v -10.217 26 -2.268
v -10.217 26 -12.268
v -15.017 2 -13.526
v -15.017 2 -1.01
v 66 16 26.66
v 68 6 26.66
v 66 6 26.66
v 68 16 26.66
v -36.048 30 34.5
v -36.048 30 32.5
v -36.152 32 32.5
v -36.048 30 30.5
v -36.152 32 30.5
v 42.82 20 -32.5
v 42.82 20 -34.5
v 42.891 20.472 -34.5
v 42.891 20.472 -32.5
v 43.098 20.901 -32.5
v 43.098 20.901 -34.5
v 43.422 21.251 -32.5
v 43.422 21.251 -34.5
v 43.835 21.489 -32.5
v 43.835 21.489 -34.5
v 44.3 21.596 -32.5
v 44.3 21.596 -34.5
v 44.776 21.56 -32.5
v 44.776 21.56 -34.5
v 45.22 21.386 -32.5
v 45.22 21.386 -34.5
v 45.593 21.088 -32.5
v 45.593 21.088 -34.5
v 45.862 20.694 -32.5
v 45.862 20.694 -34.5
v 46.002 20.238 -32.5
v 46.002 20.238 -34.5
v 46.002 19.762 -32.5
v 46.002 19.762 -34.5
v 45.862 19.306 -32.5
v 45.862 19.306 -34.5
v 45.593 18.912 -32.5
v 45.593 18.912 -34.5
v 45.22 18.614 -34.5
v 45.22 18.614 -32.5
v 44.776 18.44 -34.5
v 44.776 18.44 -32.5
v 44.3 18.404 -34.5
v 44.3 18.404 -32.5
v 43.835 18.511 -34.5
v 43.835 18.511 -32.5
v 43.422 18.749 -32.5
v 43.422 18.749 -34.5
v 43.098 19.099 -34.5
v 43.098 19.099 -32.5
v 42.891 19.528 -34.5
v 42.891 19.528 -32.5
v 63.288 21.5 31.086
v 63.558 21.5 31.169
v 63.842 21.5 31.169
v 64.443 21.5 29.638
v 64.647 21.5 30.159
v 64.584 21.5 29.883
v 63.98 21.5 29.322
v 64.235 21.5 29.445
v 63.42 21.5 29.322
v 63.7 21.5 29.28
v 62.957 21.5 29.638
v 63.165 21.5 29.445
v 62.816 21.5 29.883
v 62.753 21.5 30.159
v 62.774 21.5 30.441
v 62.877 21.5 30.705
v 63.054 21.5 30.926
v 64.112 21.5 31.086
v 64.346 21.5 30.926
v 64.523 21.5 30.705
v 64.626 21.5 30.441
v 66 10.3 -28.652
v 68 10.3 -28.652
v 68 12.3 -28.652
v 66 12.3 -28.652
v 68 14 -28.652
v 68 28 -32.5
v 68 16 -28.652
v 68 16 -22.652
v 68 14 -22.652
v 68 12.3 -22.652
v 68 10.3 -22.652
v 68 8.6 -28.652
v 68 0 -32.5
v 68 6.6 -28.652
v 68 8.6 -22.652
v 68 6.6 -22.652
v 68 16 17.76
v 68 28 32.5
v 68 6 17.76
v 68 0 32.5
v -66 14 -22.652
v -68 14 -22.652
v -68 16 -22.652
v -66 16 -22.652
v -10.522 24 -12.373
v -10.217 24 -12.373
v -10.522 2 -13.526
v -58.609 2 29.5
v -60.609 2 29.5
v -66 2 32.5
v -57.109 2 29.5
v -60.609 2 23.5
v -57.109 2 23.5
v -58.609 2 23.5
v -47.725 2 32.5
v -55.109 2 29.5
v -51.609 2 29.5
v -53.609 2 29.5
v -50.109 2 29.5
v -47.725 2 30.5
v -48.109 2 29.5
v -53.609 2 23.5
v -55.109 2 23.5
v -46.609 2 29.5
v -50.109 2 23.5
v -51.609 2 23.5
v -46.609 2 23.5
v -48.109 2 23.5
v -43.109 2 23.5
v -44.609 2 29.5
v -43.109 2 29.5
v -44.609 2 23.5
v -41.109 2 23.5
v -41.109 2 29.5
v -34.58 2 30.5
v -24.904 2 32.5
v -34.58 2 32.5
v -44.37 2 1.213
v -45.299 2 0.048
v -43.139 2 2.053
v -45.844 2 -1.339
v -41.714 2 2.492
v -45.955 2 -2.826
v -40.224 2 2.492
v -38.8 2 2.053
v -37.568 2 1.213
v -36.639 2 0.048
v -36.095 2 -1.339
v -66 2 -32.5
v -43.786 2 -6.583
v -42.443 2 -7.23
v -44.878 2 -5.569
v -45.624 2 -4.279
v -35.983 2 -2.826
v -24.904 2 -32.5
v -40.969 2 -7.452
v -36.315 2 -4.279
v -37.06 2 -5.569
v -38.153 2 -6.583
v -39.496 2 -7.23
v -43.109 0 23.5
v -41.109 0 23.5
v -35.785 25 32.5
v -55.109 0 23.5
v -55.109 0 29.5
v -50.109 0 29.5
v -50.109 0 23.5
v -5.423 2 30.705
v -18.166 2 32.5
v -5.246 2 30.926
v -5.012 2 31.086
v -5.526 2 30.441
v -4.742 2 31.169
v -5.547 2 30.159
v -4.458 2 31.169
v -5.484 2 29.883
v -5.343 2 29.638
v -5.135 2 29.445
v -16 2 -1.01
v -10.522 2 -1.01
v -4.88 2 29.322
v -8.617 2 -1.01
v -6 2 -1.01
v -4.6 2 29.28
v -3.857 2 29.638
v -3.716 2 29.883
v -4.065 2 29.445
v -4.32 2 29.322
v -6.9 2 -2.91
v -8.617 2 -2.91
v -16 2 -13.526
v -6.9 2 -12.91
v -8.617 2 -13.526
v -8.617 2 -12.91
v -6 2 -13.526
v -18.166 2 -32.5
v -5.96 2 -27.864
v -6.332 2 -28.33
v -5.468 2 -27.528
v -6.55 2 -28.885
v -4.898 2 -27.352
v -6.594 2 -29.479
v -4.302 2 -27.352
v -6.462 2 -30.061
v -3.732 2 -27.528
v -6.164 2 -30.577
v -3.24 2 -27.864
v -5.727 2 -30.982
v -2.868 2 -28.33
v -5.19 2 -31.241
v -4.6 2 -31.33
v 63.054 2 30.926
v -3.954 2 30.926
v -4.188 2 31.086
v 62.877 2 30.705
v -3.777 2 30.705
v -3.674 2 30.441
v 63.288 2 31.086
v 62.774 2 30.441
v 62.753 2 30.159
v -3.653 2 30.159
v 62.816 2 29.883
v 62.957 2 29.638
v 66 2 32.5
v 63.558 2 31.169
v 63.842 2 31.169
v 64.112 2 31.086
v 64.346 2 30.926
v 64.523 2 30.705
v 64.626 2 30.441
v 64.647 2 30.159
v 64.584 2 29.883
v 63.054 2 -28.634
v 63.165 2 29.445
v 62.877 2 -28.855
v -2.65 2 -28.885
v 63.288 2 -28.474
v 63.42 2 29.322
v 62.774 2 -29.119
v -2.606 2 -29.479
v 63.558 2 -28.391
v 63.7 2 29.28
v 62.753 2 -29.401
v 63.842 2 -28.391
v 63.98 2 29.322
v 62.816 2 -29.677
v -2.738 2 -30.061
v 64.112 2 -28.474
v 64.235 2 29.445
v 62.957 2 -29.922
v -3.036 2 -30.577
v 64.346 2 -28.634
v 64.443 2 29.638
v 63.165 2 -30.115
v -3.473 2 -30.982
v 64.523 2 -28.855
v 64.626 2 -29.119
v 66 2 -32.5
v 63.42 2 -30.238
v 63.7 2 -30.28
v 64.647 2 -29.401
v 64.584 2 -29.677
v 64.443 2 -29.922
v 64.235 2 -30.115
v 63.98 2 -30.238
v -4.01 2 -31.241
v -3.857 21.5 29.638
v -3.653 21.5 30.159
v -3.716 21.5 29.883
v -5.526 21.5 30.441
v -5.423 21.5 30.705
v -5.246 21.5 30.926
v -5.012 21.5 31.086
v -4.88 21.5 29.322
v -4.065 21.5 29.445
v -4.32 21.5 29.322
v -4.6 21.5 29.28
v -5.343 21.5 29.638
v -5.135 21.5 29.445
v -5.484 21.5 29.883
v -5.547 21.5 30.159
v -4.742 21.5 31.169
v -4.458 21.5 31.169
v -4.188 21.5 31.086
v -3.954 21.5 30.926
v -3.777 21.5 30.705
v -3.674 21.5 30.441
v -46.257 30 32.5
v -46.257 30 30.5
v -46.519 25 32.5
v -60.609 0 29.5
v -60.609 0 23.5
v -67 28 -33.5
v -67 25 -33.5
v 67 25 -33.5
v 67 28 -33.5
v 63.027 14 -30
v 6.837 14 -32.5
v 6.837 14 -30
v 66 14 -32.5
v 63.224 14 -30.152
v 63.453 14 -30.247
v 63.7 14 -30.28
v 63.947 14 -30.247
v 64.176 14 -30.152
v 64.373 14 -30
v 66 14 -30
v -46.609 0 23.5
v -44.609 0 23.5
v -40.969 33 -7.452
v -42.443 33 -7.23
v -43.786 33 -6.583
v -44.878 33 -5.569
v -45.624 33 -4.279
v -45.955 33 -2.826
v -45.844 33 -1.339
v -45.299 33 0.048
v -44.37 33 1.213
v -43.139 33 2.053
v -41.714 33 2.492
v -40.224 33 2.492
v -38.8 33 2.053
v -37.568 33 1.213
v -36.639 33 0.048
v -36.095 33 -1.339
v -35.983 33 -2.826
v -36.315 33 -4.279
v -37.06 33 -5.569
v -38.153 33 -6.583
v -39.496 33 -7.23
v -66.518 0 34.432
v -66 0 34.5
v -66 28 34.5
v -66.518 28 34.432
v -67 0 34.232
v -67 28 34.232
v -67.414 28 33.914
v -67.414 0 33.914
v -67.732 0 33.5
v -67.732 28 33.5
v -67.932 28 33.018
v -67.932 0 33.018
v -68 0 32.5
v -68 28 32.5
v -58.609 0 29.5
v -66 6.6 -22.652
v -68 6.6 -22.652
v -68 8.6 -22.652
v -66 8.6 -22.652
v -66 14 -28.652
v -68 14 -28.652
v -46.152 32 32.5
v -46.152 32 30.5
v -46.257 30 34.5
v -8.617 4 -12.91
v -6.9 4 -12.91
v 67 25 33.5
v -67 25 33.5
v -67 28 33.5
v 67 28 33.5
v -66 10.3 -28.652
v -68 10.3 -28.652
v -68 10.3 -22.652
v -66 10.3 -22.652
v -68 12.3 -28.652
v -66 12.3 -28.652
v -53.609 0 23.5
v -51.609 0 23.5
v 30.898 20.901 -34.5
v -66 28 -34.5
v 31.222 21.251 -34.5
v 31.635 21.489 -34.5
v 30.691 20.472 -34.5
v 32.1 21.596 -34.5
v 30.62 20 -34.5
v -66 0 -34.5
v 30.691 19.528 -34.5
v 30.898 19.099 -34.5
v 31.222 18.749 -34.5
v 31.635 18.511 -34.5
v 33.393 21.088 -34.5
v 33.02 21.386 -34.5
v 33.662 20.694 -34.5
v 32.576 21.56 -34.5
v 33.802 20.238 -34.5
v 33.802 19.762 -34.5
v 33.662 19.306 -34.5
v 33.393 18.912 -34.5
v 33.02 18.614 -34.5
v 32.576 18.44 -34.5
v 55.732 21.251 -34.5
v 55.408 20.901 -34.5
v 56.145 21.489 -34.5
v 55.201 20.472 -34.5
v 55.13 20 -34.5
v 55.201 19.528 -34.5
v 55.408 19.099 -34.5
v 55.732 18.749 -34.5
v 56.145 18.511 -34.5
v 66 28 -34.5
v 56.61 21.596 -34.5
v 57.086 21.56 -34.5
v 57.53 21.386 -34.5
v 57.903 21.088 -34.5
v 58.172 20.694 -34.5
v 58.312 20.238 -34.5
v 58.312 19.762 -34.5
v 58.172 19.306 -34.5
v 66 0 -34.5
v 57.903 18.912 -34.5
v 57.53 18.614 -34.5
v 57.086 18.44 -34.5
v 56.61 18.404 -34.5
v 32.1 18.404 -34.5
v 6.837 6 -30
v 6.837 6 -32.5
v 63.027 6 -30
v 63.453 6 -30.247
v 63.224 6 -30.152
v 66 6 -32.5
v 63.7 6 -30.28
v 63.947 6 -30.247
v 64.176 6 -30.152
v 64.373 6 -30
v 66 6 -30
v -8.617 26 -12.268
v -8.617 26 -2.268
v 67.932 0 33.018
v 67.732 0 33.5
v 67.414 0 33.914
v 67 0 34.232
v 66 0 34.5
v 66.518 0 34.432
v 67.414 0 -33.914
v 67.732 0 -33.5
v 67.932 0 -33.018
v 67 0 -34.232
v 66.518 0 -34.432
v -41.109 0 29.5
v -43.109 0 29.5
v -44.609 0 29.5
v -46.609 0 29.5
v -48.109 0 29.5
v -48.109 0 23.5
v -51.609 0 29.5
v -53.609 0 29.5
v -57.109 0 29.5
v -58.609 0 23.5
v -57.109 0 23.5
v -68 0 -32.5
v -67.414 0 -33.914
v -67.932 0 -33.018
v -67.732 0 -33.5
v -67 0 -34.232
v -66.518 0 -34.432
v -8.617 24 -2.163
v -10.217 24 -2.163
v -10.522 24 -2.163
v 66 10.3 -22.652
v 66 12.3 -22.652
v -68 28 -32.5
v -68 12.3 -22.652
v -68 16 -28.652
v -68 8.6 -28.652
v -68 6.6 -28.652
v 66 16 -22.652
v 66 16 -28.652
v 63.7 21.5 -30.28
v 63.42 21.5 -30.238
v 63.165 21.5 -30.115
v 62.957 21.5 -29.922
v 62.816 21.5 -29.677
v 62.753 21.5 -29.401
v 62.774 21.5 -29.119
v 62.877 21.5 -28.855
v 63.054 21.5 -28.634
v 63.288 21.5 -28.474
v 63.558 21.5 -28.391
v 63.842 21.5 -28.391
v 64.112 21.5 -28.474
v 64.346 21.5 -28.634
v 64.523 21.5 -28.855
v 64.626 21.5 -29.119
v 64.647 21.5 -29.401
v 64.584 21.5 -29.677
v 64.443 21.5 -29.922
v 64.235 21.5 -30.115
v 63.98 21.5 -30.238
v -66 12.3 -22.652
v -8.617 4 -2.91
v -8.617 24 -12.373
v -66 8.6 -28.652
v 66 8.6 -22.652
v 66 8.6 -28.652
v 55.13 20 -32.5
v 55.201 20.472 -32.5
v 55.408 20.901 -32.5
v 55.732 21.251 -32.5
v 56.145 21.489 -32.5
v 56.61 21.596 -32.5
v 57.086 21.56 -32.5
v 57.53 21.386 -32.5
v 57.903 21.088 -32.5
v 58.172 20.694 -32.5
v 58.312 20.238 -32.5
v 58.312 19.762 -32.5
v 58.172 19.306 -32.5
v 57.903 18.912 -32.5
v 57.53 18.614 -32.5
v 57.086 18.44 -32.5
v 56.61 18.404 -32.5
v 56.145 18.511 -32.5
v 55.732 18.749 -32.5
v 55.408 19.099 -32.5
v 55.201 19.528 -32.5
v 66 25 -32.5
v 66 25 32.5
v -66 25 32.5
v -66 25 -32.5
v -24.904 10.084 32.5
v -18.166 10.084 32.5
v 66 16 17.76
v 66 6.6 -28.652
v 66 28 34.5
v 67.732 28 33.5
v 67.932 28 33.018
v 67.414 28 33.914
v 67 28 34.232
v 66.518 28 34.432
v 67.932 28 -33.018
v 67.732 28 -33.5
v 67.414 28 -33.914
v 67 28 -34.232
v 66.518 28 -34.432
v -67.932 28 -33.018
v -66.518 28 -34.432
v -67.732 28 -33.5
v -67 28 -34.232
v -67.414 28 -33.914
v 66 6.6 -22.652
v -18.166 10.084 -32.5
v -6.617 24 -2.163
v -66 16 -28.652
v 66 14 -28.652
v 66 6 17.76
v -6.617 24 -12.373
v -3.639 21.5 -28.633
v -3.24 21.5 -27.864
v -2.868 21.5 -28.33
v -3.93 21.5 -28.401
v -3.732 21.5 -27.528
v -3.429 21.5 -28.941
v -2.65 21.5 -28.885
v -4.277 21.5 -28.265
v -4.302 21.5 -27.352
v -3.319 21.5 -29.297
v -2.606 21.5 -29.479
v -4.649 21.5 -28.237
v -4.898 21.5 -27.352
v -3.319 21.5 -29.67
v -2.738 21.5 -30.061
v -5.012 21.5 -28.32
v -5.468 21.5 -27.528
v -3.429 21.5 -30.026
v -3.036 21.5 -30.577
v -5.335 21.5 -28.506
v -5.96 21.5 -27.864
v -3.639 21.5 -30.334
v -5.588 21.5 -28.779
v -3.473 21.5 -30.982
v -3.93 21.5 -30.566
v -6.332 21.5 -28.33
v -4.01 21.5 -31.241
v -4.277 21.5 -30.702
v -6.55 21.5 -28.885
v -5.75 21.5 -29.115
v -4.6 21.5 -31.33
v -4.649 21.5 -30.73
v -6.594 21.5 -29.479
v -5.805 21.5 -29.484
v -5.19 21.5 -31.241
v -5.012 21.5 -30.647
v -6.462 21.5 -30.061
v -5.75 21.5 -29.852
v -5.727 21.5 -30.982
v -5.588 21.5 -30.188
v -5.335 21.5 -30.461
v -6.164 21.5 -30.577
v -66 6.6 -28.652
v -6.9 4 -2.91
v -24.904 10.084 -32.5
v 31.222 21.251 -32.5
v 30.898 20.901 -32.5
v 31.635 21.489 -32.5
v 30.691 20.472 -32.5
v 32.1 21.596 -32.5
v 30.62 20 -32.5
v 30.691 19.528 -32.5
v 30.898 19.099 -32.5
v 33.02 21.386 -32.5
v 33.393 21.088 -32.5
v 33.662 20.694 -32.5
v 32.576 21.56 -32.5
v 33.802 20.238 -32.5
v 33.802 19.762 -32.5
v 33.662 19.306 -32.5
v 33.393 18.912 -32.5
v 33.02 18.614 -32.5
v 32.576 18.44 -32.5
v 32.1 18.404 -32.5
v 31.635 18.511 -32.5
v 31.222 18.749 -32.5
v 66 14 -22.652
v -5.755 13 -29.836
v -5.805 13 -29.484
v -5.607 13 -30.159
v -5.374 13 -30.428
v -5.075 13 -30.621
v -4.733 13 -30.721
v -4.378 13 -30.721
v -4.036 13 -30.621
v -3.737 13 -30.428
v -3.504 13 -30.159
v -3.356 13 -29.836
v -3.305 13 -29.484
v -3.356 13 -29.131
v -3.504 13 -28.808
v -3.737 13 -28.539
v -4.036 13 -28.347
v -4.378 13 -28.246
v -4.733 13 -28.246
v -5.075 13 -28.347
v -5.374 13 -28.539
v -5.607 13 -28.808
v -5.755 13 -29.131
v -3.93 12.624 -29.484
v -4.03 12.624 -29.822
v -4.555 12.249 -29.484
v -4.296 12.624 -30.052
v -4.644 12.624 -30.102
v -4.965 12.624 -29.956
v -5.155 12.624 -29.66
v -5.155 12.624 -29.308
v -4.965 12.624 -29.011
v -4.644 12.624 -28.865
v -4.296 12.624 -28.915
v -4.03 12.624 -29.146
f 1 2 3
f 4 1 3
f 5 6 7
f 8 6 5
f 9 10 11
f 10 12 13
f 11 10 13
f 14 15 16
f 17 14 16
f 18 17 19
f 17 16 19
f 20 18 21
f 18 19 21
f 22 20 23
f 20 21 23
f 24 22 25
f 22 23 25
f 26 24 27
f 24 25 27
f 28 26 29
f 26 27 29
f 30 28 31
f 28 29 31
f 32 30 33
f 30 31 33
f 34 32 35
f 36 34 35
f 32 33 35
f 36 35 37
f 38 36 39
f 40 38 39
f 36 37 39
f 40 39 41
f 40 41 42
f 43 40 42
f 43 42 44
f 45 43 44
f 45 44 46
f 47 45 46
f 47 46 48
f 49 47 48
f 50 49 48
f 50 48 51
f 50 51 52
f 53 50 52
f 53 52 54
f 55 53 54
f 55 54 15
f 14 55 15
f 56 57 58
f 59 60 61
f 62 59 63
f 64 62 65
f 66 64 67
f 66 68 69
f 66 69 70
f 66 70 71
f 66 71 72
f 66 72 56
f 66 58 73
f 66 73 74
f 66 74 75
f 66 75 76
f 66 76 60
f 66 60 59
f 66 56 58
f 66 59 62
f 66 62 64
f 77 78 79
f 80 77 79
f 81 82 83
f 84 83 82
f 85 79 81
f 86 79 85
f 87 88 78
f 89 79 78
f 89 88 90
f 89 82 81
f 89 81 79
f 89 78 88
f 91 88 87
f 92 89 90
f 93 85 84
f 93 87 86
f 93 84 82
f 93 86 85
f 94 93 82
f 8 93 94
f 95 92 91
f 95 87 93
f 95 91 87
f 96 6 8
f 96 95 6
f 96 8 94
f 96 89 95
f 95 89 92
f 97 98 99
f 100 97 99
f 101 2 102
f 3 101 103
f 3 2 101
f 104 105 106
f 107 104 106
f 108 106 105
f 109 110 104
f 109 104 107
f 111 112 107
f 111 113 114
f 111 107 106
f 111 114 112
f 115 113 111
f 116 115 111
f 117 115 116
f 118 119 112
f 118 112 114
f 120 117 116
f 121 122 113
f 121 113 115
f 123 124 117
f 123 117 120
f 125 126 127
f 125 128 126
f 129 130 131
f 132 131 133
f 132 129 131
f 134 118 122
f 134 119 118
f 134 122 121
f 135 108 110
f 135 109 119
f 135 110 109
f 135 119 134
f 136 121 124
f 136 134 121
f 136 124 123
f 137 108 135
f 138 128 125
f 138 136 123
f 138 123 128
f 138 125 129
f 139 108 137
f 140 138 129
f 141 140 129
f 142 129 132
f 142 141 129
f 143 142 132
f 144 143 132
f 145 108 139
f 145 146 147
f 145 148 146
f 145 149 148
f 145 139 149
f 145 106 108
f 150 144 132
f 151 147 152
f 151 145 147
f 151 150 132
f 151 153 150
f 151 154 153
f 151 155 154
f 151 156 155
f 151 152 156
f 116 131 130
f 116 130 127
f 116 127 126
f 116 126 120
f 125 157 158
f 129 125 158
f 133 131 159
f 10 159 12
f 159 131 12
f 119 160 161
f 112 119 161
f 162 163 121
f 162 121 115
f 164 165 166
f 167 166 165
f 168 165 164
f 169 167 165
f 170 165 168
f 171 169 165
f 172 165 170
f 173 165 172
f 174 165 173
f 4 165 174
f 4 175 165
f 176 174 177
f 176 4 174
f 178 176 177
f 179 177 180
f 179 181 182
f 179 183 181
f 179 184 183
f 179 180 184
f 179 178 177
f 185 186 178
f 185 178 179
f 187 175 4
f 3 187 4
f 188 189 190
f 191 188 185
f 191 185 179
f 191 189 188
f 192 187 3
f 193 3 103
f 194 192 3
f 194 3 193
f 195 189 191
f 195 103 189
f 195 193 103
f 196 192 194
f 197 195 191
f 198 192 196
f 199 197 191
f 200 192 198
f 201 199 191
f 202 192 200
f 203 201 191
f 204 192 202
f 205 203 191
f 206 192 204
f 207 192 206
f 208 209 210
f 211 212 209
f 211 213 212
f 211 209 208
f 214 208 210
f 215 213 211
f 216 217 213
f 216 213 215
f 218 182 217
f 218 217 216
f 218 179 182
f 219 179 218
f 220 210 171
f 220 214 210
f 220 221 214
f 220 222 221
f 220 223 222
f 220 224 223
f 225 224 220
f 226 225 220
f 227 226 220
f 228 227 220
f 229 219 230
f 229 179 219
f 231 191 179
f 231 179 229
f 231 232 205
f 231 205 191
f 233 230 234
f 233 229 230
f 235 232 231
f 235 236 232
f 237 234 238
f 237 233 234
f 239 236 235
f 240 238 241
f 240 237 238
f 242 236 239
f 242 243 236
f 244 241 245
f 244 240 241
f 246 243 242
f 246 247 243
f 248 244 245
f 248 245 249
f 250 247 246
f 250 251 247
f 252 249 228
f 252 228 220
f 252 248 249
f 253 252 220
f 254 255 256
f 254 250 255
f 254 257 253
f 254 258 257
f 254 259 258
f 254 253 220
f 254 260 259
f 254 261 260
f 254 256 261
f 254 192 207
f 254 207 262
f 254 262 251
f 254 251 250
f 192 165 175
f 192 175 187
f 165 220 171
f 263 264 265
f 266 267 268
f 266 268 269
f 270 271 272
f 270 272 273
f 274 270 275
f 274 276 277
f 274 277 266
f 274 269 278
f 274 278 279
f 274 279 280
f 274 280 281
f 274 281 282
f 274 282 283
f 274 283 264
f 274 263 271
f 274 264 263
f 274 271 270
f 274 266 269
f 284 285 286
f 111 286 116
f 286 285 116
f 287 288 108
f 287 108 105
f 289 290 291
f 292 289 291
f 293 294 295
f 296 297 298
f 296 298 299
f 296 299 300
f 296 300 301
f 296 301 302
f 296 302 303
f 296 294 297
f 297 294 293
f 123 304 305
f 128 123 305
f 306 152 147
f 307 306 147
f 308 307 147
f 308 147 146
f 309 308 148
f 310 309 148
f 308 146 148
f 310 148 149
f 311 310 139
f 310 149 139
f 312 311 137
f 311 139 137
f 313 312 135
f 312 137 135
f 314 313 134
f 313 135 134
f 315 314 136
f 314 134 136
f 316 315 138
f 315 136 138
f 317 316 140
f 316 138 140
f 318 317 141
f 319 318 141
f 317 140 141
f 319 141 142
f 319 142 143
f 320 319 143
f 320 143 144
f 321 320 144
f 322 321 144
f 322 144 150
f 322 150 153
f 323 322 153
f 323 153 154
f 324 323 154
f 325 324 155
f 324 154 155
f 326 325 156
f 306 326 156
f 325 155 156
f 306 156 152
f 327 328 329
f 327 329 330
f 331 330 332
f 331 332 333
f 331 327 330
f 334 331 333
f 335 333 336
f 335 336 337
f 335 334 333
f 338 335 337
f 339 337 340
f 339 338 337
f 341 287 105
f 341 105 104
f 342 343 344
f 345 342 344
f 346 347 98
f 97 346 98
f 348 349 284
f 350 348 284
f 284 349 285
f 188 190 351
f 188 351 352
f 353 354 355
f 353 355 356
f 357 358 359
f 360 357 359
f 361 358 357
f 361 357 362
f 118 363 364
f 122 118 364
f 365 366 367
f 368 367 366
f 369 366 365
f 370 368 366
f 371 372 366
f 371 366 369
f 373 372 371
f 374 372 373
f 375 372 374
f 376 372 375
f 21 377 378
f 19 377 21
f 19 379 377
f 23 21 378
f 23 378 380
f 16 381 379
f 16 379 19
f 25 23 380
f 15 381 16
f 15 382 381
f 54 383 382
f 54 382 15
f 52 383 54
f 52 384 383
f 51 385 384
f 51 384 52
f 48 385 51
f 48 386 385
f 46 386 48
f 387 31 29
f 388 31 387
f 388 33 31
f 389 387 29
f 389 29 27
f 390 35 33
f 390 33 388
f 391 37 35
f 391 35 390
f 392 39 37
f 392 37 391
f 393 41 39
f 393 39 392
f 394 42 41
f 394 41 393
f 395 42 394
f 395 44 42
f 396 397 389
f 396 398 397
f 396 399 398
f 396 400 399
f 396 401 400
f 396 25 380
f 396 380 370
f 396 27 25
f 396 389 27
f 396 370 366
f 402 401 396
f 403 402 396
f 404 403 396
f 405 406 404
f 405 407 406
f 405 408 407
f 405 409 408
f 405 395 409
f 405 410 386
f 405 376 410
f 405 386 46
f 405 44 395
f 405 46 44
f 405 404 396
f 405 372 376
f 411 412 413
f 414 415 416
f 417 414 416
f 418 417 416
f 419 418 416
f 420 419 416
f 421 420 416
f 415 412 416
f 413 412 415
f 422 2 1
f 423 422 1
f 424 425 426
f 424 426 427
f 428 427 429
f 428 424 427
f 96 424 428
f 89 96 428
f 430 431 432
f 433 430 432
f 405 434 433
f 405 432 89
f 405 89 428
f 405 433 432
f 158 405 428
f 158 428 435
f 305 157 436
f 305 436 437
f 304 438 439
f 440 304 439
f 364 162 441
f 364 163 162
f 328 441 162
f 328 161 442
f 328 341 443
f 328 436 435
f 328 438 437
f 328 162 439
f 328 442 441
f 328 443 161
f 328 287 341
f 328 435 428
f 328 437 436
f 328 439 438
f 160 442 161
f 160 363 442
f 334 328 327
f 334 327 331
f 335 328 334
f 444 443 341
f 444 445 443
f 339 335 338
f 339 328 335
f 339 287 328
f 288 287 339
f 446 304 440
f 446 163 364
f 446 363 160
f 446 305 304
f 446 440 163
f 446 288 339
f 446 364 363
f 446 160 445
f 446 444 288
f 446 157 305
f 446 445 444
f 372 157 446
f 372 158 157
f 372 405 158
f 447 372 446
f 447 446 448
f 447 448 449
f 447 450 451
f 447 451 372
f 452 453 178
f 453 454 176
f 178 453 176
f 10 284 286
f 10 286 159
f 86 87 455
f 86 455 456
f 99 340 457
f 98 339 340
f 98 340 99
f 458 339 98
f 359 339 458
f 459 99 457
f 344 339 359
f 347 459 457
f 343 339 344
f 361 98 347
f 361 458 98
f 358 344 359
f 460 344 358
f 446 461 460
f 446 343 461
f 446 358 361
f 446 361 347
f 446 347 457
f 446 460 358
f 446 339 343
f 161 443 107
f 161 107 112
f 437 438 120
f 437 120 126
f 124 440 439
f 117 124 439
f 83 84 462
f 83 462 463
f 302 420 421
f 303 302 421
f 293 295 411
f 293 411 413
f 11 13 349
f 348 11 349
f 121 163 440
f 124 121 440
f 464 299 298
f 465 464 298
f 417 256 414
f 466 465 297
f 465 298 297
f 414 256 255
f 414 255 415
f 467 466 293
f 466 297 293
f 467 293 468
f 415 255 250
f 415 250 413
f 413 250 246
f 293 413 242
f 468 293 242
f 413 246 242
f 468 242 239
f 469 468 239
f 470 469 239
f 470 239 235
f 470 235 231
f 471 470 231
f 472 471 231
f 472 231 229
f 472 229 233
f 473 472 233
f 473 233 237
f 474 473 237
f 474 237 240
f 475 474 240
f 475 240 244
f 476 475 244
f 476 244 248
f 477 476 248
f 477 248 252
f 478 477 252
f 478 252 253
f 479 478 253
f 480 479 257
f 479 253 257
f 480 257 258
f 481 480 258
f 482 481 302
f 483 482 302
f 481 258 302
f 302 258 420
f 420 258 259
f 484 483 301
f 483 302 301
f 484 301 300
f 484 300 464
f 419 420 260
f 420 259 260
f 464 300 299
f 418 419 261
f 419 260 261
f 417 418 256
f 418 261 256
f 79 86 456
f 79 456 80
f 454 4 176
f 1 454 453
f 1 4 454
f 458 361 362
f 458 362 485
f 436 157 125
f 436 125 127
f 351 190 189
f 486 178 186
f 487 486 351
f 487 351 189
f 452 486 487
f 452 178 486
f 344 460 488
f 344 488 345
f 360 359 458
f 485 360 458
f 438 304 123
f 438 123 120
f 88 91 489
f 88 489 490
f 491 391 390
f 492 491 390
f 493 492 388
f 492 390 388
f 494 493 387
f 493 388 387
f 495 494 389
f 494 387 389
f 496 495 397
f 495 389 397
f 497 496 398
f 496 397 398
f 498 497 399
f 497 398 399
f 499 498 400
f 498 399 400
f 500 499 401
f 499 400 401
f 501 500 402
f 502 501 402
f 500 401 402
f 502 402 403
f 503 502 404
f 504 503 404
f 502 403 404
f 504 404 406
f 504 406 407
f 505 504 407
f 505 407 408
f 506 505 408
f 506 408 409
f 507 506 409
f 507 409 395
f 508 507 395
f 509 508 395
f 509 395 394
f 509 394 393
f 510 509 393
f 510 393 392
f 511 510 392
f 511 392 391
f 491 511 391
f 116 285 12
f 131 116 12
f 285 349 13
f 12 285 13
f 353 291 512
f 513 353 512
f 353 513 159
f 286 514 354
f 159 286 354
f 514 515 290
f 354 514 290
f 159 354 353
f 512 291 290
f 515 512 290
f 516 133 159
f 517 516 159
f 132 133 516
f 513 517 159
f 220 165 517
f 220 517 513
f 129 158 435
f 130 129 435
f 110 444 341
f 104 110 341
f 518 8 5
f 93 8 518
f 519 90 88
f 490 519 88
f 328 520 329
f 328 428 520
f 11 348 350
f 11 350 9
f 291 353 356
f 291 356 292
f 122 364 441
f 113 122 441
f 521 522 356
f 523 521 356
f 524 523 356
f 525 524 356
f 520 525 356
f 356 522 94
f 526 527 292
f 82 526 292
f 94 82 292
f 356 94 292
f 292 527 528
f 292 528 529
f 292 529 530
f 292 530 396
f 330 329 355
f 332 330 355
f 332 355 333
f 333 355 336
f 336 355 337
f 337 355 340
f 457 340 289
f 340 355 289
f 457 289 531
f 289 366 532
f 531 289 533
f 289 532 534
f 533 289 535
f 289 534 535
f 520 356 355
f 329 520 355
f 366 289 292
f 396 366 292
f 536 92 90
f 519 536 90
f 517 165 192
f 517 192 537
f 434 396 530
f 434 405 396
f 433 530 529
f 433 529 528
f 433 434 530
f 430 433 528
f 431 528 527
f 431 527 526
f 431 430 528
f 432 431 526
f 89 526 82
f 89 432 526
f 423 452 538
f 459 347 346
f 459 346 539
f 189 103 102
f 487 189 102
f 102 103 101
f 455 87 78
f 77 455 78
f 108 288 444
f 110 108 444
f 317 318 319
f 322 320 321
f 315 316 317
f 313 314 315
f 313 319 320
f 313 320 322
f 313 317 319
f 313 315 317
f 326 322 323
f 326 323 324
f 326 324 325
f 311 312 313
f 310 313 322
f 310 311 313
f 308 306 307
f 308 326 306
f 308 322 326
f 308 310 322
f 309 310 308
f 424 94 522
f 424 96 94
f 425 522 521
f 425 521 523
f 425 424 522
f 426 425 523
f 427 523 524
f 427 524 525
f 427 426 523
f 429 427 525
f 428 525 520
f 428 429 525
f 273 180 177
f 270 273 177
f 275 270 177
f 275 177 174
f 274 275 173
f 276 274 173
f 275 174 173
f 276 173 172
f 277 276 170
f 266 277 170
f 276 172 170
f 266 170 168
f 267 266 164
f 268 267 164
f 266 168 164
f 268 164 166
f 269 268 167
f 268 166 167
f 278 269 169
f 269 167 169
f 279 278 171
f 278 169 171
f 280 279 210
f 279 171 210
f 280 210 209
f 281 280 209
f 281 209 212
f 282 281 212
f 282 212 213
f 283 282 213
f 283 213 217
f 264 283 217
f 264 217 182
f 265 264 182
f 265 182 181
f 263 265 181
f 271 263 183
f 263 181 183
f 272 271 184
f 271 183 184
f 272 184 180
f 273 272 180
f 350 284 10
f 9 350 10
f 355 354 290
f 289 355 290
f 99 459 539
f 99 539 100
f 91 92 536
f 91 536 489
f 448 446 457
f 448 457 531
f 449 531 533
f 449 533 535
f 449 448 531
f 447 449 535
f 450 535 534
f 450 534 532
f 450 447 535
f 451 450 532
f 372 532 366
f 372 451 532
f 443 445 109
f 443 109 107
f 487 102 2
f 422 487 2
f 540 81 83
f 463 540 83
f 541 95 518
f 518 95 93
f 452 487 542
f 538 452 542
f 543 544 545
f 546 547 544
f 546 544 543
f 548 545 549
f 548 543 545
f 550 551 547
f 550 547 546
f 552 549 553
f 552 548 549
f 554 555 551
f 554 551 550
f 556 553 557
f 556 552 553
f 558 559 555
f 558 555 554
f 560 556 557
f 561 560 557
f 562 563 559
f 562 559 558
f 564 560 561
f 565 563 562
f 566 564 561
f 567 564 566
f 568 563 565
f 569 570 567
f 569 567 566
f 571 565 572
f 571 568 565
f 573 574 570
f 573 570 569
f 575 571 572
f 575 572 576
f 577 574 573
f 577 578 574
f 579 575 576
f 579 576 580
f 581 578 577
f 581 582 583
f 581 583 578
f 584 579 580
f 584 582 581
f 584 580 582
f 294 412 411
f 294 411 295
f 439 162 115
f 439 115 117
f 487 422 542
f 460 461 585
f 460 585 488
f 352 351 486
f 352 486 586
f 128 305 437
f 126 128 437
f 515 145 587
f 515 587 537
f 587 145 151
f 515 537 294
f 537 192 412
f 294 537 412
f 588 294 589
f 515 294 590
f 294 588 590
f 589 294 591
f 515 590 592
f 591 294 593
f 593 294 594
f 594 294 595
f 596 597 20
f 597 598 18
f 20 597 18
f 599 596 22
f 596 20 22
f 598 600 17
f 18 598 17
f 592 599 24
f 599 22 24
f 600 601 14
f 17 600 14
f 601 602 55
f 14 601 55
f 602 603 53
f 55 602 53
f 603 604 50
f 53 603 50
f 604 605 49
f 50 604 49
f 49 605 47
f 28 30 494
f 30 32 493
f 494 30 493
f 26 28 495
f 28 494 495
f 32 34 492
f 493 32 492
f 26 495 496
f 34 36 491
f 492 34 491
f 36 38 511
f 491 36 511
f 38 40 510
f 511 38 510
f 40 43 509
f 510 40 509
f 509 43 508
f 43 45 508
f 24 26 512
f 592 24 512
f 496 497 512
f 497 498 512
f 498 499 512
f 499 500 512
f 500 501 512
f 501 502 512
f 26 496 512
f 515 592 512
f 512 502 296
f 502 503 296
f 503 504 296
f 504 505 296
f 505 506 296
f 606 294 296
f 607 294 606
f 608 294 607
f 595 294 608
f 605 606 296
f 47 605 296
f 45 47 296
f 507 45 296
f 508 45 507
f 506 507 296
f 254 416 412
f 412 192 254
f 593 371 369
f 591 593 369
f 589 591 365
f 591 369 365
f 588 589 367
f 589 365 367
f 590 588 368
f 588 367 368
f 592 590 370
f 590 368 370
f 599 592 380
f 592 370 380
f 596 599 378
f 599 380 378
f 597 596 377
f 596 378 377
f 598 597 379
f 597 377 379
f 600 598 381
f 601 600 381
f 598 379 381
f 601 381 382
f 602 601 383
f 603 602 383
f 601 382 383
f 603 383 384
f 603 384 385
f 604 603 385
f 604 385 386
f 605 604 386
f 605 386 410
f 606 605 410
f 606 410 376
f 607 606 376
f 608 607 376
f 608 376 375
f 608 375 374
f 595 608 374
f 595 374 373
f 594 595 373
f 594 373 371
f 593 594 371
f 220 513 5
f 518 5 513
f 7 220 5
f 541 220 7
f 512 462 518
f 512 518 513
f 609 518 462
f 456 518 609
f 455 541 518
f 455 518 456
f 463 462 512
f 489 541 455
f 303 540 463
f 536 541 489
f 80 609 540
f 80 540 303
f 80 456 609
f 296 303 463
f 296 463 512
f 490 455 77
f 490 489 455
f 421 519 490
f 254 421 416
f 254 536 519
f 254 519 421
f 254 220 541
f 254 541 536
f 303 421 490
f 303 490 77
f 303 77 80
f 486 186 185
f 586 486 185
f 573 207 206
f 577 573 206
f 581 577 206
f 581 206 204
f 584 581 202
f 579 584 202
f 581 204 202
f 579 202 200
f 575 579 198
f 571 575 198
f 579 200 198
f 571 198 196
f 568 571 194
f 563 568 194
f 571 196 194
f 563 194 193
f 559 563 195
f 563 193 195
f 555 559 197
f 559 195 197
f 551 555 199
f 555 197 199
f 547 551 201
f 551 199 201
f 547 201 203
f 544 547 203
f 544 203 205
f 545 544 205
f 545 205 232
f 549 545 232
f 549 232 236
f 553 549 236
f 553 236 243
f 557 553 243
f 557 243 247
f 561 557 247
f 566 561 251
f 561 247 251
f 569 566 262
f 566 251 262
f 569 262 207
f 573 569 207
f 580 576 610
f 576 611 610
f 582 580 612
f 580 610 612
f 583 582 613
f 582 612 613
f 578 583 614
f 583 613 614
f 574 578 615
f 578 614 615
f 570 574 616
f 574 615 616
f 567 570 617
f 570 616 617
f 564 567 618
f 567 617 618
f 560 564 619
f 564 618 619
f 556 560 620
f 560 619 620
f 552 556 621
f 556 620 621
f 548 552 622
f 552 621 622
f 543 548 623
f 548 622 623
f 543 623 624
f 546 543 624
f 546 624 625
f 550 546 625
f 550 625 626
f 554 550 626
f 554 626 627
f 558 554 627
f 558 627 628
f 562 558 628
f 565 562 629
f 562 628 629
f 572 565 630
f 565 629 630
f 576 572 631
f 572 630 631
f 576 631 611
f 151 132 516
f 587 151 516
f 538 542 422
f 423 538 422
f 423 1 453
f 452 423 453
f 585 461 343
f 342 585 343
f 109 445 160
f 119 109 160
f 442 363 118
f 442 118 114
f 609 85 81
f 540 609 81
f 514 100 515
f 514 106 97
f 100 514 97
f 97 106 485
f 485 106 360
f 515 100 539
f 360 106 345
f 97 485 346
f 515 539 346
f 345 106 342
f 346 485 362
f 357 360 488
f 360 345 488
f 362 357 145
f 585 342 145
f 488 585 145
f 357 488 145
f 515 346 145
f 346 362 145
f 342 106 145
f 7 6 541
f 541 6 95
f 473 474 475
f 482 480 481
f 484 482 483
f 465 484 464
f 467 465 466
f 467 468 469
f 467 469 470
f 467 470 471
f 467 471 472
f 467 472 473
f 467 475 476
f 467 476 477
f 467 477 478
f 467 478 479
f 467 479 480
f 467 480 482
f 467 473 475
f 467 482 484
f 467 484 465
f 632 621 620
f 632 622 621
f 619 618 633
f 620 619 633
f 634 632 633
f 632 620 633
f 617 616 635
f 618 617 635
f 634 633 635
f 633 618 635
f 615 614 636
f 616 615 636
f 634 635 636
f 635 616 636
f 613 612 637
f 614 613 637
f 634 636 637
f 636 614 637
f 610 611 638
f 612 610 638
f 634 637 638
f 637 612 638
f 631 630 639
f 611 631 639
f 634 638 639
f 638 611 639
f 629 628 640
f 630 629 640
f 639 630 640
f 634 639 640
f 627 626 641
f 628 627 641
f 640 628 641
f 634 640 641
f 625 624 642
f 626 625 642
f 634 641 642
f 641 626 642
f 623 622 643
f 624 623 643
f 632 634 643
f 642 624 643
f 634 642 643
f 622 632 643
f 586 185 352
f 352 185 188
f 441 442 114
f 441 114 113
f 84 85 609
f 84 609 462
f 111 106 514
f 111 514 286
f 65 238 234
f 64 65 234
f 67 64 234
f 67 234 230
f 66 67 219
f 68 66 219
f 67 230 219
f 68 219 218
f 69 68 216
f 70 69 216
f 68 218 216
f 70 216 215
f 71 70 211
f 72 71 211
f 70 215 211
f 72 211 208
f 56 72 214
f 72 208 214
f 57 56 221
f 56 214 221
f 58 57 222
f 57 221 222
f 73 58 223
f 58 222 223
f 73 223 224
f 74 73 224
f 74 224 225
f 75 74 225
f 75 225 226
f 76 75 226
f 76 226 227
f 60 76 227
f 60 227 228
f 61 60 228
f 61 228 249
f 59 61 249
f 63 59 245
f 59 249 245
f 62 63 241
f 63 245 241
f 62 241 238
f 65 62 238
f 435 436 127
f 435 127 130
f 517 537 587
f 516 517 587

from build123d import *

# Parameters (mm, degrees)
SKETCH_2_W                  = 132
SKETCH_2_H                  = 65
EXTRUDE_2_DEPTH             = 2
SKETCH_2_3_W                = 132
SKETCH_2_3_H                = 65
EXTRUDE_3_DEPTH             = 25
SKETCH_4_R                  = 0.95
SKETCH_4_R_2                = 2
EXTRUDE_4_DEPTH             = 19.5
SKETCH_9_W                  = 6
SKETCH_9_H                  = 2
CUT_EXTRUDE_1_DEPTH         = 23
SKETCH_5_W                  = 8.9
SKETCH_5_H                  = 10
SKETCH_5_W_2                = 6
SKETCH_5_H_2                = 2
CUT_EXTRUDE_2_DEPTH         = 2
SKETCH_11_W                 = 2
SKETCH_11_H                 = 6
CUT_EXTRUDE_3_DEPTH         = 23
SKETCH_12_R                 = 1.6
CUT_EXTRUDE_4_DEPTH         = 23
HOLE_WIZARD_M3_3_D          = 2.5
HOLE_WIZARD_M3_3_DEPTH      = 8.5
HOLE_WIZARD_M3_3_TIP        = 0.751075774
SKETCH_24_W                 = 134
SKETCH_24_H                 = 67
EXTRUDE_5_DEPTH             = 3
SKETCH_25_R                 = 5
EXTRUDE_6_DEPTH             = 31
MACRO_START                 = 30.5
MACRO_FEATURE_1_DEPTH       = 4
MACRO_FEATURE_1_2_DEPTH     = 2
MACRO_START_2               = 45.608387387
MACRO_FEATURE_1_3_OUTLINE_W = 13
MACRO_FEATURE_1_3_OUTLINE_H = 6
MACRO_FEATURE_1_3_DEPTH     = 2.391612613
SKETCH_28_W                 = 4
SKETCH_28_H                 = 10
EXTRUDE_7_DEPTH             = 2
MACRO_START_3               = -10.52248
MACRO_FEATURE_2_DEPTH       = 1.905691985
MACRO_START_4               = -10.216788015
MACRO_FEATURE_2_2_DEPTH     = 1.6
MACRO_START_5               = -13.52599806
MACRO_FEATURE_2_3_DEPTH     = 12.515573406
MACRO_START_6               = -12.373026916
MACRO_FEATURE_2_4_DEPTH     = 10.209631117
MACRO_START_7               = -16
MACRO_FEATURE_2_5_DEPTH     = 10
SKETCH_32_W                 = 59.163412992
SKETCH_32_H                 = 8
EXTRUDE_9_DEPTH             = 2.5
EXTRUDE_10_REACH            = 103.005
SKETCH_31_W                 = 6.738210925
SKETCH_31_H                 = 8.083848138


with BuildPart() as part:
    # 草图2 → 凸台-拉伸2 (new body)
    with BuildSketch(Plane(origin=(0, 0, 0), x_dir=(1, 0, 0), z_dir=(0, 1, 0))):
        Rectangle(SKETCH_2_W, SKETCH_2_H)
    extrude(amount=EXTRUDE_2_DEPTH)

    # 草图2<3> → 凸台-拉伸3 (add)
    with BuildSketch(Plane(origin=(0, 0, 0), x_dir=(1, 0, 0), z_dir=(0, 1, 0))):
        with BuildLine():
            Line((-66, 34.5), (66, 34.5))
            ThreePointArc((66, 34.5), (67.414213562, 33.914213562), (68, 32.5))
            Line((68, 32.5), (68, -32.5))
            ThreePointArc((68, -32.5), (67.414213562, -33.914213562), (66, -34.5))
            Line((66, -34.5), (-66, -34.5))
            ThreePointArc((-66, -34.5), (-67.414213562, -33.914213562), (-68, -32.5))
            Line((-68, -32.5), (-68, 32.5))
            ThreePointArc((-68, 32.5), (-67.414213562, 33.914213562), (-66, 34.5))
        make_face()
        Rectangle(SKETCH_2_3_W, SKETCH_2_3_H, mode=Mode.SUBTRACT)
    extrude(amount=EXTRUDE_3_DEPTH)

    # 草图4 → 凸台-拉伸4 (add)
    with BuildSketch(Plane(origin=(0, 2, 0), x_dir=(1, 0, 0), z_dir=(0, 1, 0))):
        with Locations(Location((63.7, 29.33, 0), (0, 0, 90))):
            Circle(SKETCH_4_R)
        with Locations(Location((63.7, -30.23, 0), (0, 0, 90))):
            Circle(SKETCH_4_R)
        with Locations(Location((-4.6, 29.33, 0), (0, 0, 90))):
            Circle(SKETCH_4_R_2)
        with Locations(Location((-4.6, -30.23, 0), (0, 0, 90))):
            Circle(SKETCH_4_R)
    extrude(amount=EXTRUDE_4_DEPTH)

    # 草图9 → 切除-拉伸1 (cut)
    with BuildSketch(Plane.ZY.offset(68)):
        with Locations((-25.652476361, 14.999984766)):
            Rectangle(SKETCH_9_W, SKETCH_9_H)
        with Locations((-25.652476361, 11.299984766)):
            Rectangle(SKETCH_9_W, SKETCH_9_H)
        with Locations((-25.652476361, 7.599984766)):
            Rectangle(SKETCH_9_W, SKETCH_9_H)
    extrude(amount=-CUT_EXTRUDE_1_DEPTH, mode=Mode.SUBTRACT)

    # 草图5 → 切除-拉伸2 (cut)
    with BuildSketch(Plane(origin=(68, 0, 0), x_dir=(0, 0, -1), z_dir=(1, 0, 0))):
        with Locations((-22.21, 11)):
            Rectangle(SKETCH_5_W, SKETCH_5_H)
        with Locations((25.652457488, 15)):
            Rectangle(SKETCH_5_W_2, SKETCH_5_H_2)
        with Locations((25.652457488, 11.3)):
            Rectangle(SKETCH_5_W_2, SKETCH_5_H_2)
        with Locations((25.652457488, 7.6)):
            Rectangle(SKETCH_5_W_2, SKETCH_5_H_2)
    extrude(amount=-CUT_EXTRUDE_2_DEPTH, mode=Mode.SUBTRACT)

    # 草图11 → 切除-拉伸3 (cut)
    with BuildSketch(Plane.XZ):
        with Locations((-42.109364057, 26.5)):
            Rectangle(SKETCH_11_W, SKETCH_11_H)
        with Locations((-45.609364057, 26.5)):
            Rectangle(SKETCH_11_W, SKETCH_11_H)
        with Locations((-49.109364057, 26.5)):
            Rectangle(SKETCH_11_W, SKETCH_11_H)
        with Locations((-52.609364057, 26.5)):
            Rectangle(SKETCH_11_W, SKETCH_11_H)
        with Locations((-56.109364057, 26.5)):
            Rectangle(SKETCH_11_W, SKETCH_11_H)
        with Locations((-59.609364057, 26.5)):
            Rectangle(SKETCH_11_W, SKETCH_11_H)
    extrude(amount=-CUT_EXTRUDE_3_DEPTH, mode=Mode.SUBTRACT)

    # 草图12 → 切除-拉伸4 (cut)
    with BuildSketch(Plane(origin=(0, 0, -34.5), x_dir=(-1, 0, 0), z_dir=(0, 0, -1))):
        with Locations((-56.73, 20)):
            Circle(SKETCH_12_R)
        with Locations((-44.42, 20)):
            Circle(SKETCH_12_R)
        with Locations((-32.22, 20)):
            Circle(SKETCH_12_R)
    extrude(amount=-CUT_EXTRUDE_4_DEPTH, mode=Mode.SUBTRACT)

    # M3 螺纹孔3
    with Locations(Plane(origin=(0, 21.5, 0), x_dir=(1, 0, 0), z_dir=(0, 1, 0))):
        with Locations((-4.555471055, 29.483622127)):
            Hole(HOLE_WIZARD_M3_3_D / 2, depth=HOLE_WIZARD_M3_3_DEPTH)
            with Locations((0, 0, -(HOLE_WIZARD_M3_3_DEPTH + HOLE_WIZARD_M3_3_TIP / 2))):  # 118° drill point
                Cone(0, HOLE_WIZARD_M3_3_D / 2, HOLE_WIZARD_M3_3_TIP, mode=Mode.SUBTRACT)

    # 草图24 → 凸台-拉伸5 (add)
    with BuildSketch(Plane(origin=(0, 25, 0), x_dir=(1, 0, 0), z_dir=(0, 1, 0))):
        with BuildLine():
            Line((66, -34.5), (-66, -34.5))
            ThreePointArc((-66, -34.5), (-67.414213562, -33.914213562), (-68, -32.5))
            Line((-68, -32.5), (-68, 32.5))
            ThreePointArc((-68, 32.5), (-67.414213562, 33.914213562), (-66, 34.5))
            Line((-66, 34.5), (66, 34.5))
            ThreePointArc((66, 34.5), (67.414213562, 33.914213562), (68, 32.5))
            Line((68, 32.5), (68, -32.5))
            ThreePointArc((68, -32.5), (67.414213562, -33.914213562), (66, -34.5))
        make_face()
        Rectangle(SKETCH_24_W, SKETCH_24_H, mode=Mode.SUBTRACT)
    extrude(amount=EXTRUDE_5_DEPTH)

    # 草图25 → 凸台-拉伸6 (add)
    with BuildSketch(Plane(origin=(0, 2, 0), x_dir=(1, 0, 0), z_dir=(0, 1, 0))):
        with Locations(Location((-40.969280892, 2.451986174, 0), (0, 0, 90))):
            Circle(SKETCH_25_R)
    extrude(amount=EXTRUDE_6_DEPTH)



with BuildPart() as body_2:
    # Macro Feature 1: read off the stored shape, not the designer's step
    # Macro Feature 1 outline → Macro Feature 1 (new body)
    with BuildSketch(Plane.XY.offset(MACRO_START)):
        Polygon((-36.152325447, 32), (-46.152325447, 32), (-46.257141006, 30), (-36.047509888, 30), align=None)
    extrude(amount=MACRO_FEATURE_1_DEPTH)


with BuildPart() as part_1:
    add(part.part)

    add(body_2.part)  # Macro Feature 1 2 merges body 2
    # Macro Feature 1 2 outline → Macro Feature 1 2 (add)
    with BuildSketch(Plane.XY.offset(MACRO_START)):
        Polygon((-36.047509888, 30), (-46.257141006, 30), (-47.724558825, 2), (-34.580092068, 2), align=None)
    extrude(amount=MACRO_FEATURE_1_2_DEPTH)

    # Macro Feature 1 3 outline → Macro Feature 1 3 (cut)
    with BuildSketch(Plane(origin=(0, 0, 0), x_dir=(1, 0, 0), z_dir=(0, 0.707106781186547, 0.707106781186548)).offset(MACRO_START_2)):
        with Locations((-41.5, -2)):
            Rectangle(MACRO_FEATURE_1_3_OUTLINE_W, MACRO_FEATURE_1_3_OUTLINE_H)
    extrude(amount=MACRO_FEATURE_1_3_DEPTH, mode=Mode.SUBTRACT)

    # 草图28 → 凸台-拉伸7 (add)
    with BuildSketch(Plane(origin=(0, 2, 0), x_dir=(1, 0, 0), z_dir=(0, 1, 0))):
        with Locations((-8.9, 7.909574936)):
            Rectangle(SKETCH_28_W, SKETCH_28_H)
    extrude(amount=EXTRUDE_7_DEPTH)

    # Macro Feature 2: read off the stored shape, not the designer's step
    # Macro Feature 2 outline → Macro Feature 2 (add)
    with BuildSketch(Plane.YZ.offset(MACRO_START_3)):
        Polygon((2, -12.909574936), (2, -13.52599806), (24, -12.373026916), (24, -2.163395799), (2, -1.010424654), (2, -2.909574936), (4, -2.909574936), (4, -12.909574936), align=None)
    extrude(amount=MACRO_FEATURE_2_DEPTH)

    # Macro Feature 2 2 outline → Macro Feature 2 2 (add)
    with BuildSketch(Plane.YZ.offset(MACRO_START_4)):
        Polygon((24, -2.163395799), (24, -12.373026916), (26, -12.268211357), (26, -2.268211357), align=None)
    extrude(amount=MACRO_FEATURE_2_2_DEPTH)

    # Macro Feature 2 3 outline → Macro Feature 2 3 (add)
    with BuildSketch(Plane.XY.offset(MACRO_START_5)):
        Polygon((-10.216788015, 24), (-10.216788015, 26), (-15.016788015, 2), (-10.52248, 2), (-10.52248, 24), align=None)
    extrude(amount=MACRO_FEATURE_2_3_DEPTH)

    # Macro Feature 2 4 outline → Macro Feature 2 4 (add)
    with BuildSketch(Plane.XY.offset(MACRO_START_6)):
        Polygon((-8.616788015, 26), (-8.616788015, 24), (-6.616788015, 24), align=None)
    extrude(amount=MACRO_FEATURE_2_4_DEPTH)

    # Macro Feature 2 5 outline → Macro Feature 2 5 (cut)
    with BuildSketch(Plane.YZ.offset(MACRO_START_7)):
        Polygon((2, -13.52599806), (27, -13.52599806), (27, -12.215803578), (26, -12.268211357), align=None)
        Polygon((26, -2.268211357), (27, -2.320619136), (27, -1.010424654), (2, -1.010424654), align=None)
    extrude(amount=MACRO_FEATURE_2_5_DEPTH, mode=Mode.SUBTRACT)

    # 草图32 → 凸台-拉伸9 (add)
    with BuildSketch(Plane.XY.offset(-32.5)):
        with Locations((36.418293504, 10)):
            Rectangle(SKETCH_32_W, SKETCH_32_H)
    extrude(amount=EXTRUDE_9_DEPTH)

    # 草图31 → 凸台-拉伸10 (add, up to next)
    with BuildSketch(Plane(origin=(0, 0, 32.5), x_dir=(-1, 0, 0), z_dir=(0, 0, -1)), mode=Mode.PRIVATE) as extrude_10_sk1:
        with Locations((21.534982766, 6.041924069)):
            Rectangle(SKETCH_31_W, SKETCH_31_H)
    extrude_10_tool1 = extrude(extrude_10_sk1.sketch, amount=EXTRUDE_10_REACH, mode=Mode.PRIVATE) - part_1.part
    add(extrude_10_tool1.solids().sort_by_distance((-21.534983, 6.041924, 32.5))[0])


solid = part_1.part
